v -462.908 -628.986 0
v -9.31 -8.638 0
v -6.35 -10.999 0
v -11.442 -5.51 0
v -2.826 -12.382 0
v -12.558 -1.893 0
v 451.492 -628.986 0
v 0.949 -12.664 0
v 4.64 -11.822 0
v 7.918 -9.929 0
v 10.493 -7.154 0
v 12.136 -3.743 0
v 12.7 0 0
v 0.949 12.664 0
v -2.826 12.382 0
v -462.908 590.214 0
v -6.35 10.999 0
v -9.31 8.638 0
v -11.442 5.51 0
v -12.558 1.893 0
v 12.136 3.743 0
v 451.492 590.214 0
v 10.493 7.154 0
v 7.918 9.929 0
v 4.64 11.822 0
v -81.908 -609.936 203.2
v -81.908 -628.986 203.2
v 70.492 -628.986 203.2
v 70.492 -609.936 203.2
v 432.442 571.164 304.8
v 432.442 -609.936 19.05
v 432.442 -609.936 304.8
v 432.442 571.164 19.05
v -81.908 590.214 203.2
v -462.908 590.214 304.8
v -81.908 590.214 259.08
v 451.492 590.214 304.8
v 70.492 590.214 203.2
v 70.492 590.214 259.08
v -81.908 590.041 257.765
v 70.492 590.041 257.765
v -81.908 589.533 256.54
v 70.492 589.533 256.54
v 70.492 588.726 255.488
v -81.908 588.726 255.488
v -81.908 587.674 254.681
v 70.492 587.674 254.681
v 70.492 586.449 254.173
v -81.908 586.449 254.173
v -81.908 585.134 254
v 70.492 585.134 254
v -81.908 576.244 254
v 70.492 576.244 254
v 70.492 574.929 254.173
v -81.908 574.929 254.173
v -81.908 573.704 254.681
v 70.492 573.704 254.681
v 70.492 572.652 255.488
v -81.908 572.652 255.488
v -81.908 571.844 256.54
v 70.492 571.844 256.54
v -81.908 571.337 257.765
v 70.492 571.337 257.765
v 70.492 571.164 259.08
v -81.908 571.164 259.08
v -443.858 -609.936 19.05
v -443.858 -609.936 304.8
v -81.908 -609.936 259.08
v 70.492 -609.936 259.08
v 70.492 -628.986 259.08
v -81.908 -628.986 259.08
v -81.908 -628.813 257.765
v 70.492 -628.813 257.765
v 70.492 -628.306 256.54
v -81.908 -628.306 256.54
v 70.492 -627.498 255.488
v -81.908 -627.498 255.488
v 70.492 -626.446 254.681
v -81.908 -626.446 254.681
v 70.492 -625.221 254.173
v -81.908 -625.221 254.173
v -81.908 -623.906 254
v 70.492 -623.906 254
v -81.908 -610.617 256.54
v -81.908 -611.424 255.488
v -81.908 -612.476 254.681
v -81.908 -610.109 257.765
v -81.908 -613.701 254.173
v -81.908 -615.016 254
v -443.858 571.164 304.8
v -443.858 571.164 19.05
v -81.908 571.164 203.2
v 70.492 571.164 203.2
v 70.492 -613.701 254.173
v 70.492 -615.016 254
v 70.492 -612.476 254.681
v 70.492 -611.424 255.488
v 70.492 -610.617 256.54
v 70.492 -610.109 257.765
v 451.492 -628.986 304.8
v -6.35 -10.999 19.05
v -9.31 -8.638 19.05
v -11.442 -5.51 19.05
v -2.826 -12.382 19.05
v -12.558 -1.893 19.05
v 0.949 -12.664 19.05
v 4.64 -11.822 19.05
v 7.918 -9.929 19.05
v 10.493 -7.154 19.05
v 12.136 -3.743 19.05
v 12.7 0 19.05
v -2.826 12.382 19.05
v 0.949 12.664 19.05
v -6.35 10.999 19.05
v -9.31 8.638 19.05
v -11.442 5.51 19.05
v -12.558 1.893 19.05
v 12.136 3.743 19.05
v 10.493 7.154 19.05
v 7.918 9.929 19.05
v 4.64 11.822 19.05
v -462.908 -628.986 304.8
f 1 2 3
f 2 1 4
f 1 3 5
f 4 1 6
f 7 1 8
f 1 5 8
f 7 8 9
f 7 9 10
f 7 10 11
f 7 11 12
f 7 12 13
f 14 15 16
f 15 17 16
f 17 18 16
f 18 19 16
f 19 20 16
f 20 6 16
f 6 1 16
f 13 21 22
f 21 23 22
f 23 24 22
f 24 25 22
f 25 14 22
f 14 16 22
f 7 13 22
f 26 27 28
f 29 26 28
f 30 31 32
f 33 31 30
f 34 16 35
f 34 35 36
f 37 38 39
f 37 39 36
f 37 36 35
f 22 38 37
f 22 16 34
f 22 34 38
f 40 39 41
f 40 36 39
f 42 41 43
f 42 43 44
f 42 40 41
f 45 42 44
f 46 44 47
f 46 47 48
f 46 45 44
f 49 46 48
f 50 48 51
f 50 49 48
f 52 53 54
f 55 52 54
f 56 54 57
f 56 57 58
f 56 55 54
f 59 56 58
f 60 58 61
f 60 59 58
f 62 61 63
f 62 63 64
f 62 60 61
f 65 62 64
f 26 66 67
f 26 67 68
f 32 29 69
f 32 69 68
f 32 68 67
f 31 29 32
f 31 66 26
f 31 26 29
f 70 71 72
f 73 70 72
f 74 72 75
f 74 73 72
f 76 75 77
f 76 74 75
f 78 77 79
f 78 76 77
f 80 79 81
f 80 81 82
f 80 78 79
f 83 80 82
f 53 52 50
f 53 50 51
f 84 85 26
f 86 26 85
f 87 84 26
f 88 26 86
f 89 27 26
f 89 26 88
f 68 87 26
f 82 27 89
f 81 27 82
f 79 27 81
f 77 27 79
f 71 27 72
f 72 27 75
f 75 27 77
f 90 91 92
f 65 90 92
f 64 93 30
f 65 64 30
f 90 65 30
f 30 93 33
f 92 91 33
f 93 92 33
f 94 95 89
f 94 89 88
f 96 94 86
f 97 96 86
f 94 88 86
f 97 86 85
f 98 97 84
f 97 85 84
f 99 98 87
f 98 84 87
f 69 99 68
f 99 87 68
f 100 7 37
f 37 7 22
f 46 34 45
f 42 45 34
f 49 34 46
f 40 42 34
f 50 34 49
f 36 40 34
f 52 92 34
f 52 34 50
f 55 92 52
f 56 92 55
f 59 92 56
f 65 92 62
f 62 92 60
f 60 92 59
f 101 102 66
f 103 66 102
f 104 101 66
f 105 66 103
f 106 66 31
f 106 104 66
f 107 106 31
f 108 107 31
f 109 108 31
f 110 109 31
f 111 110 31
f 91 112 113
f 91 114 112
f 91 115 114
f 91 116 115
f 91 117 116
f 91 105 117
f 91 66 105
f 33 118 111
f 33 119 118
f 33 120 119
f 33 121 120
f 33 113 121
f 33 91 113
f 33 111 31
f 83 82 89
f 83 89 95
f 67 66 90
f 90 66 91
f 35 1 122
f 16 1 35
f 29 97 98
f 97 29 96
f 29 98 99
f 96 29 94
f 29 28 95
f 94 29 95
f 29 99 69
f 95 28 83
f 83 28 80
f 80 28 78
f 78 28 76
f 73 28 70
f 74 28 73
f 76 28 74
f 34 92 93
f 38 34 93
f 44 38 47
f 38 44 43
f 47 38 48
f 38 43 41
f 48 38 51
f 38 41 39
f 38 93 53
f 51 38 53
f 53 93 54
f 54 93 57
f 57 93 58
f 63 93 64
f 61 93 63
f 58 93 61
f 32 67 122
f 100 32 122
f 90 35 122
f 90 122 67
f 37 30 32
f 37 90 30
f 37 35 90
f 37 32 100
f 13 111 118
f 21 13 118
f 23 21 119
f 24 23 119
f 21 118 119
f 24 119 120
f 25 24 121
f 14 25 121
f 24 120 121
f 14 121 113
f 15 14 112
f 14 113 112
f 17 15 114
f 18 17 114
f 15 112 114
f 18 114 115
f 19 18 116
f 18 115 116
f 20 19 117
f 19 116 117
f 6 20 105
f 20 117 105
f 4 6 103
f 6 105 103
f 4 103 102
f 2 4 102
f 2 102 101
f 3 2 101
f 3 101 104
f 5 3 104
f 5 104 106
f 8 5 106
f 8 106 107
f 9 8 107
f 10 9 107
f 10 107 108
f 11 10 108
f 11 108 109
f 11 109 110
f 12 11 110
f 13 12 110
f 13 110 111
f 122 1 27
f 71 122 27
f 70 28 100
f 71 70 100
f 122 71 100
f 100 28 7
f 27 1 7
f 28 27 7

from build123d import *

# Parameters (mm, degrees)
F0_W     = 914.4
F0_H     = 1219.2
F1_DEPTH = 304.8
F2_T     = -19.05
F3_W     = 152.4
F3_H     = 50.8
F4_DEPTH = 1280.16
F5_R     = 5.08
F6_R     = 12.7
F7_DEPTH = 25.4


with BuildPart() as f1:
    # F0 (on Top) → F1 (new body)
    with BuildSketch(Plane.XY):
        with Locations((-5.7078478858, -19.3861435029)):
            Rectangle(F0_W, F0_H)
    extrude(amount=F1_DEPTH)

    # F2
    f2_openings = [f1.faces().sort_by_distance(p)[0] for p in [
        (-5.707848, -19.386144, 304.8),
    ]]
    offset(amount=F2_T, openings=f2_openings)

    # F3 (on face) → F4 (cut)
    with BuildSketch(Plane.XZ.offset(628.9861435029)):
        with Locations((-5.7078478858, 228.6)):
            Rectangle(F3_W, F3_H)
    extrude(amount=-F4_DEPTH, mode=Mode.SUBTRACT)

    # F5
    f5_edges = [f1.edges().sort_by_distance(p)[0] for p in [
        (-5.707848, -609.936144, 254),
        (-5.707848, -628.986144, 254),
        (-5.707848, 571.163856, 254),
        (-5.707848, 590.213856, 254),
    ]]
    fillet(f5_edges, radius=F5_R)

    # F6 (on face) → F7 (cut)
    with BuildSketch(Plane.XY.offset(19.05)):
        Circle(F6_R)
    extrude(amount=-F7_DEPTH, mode=Mode.SUBTRACT)


solid = f1.part
